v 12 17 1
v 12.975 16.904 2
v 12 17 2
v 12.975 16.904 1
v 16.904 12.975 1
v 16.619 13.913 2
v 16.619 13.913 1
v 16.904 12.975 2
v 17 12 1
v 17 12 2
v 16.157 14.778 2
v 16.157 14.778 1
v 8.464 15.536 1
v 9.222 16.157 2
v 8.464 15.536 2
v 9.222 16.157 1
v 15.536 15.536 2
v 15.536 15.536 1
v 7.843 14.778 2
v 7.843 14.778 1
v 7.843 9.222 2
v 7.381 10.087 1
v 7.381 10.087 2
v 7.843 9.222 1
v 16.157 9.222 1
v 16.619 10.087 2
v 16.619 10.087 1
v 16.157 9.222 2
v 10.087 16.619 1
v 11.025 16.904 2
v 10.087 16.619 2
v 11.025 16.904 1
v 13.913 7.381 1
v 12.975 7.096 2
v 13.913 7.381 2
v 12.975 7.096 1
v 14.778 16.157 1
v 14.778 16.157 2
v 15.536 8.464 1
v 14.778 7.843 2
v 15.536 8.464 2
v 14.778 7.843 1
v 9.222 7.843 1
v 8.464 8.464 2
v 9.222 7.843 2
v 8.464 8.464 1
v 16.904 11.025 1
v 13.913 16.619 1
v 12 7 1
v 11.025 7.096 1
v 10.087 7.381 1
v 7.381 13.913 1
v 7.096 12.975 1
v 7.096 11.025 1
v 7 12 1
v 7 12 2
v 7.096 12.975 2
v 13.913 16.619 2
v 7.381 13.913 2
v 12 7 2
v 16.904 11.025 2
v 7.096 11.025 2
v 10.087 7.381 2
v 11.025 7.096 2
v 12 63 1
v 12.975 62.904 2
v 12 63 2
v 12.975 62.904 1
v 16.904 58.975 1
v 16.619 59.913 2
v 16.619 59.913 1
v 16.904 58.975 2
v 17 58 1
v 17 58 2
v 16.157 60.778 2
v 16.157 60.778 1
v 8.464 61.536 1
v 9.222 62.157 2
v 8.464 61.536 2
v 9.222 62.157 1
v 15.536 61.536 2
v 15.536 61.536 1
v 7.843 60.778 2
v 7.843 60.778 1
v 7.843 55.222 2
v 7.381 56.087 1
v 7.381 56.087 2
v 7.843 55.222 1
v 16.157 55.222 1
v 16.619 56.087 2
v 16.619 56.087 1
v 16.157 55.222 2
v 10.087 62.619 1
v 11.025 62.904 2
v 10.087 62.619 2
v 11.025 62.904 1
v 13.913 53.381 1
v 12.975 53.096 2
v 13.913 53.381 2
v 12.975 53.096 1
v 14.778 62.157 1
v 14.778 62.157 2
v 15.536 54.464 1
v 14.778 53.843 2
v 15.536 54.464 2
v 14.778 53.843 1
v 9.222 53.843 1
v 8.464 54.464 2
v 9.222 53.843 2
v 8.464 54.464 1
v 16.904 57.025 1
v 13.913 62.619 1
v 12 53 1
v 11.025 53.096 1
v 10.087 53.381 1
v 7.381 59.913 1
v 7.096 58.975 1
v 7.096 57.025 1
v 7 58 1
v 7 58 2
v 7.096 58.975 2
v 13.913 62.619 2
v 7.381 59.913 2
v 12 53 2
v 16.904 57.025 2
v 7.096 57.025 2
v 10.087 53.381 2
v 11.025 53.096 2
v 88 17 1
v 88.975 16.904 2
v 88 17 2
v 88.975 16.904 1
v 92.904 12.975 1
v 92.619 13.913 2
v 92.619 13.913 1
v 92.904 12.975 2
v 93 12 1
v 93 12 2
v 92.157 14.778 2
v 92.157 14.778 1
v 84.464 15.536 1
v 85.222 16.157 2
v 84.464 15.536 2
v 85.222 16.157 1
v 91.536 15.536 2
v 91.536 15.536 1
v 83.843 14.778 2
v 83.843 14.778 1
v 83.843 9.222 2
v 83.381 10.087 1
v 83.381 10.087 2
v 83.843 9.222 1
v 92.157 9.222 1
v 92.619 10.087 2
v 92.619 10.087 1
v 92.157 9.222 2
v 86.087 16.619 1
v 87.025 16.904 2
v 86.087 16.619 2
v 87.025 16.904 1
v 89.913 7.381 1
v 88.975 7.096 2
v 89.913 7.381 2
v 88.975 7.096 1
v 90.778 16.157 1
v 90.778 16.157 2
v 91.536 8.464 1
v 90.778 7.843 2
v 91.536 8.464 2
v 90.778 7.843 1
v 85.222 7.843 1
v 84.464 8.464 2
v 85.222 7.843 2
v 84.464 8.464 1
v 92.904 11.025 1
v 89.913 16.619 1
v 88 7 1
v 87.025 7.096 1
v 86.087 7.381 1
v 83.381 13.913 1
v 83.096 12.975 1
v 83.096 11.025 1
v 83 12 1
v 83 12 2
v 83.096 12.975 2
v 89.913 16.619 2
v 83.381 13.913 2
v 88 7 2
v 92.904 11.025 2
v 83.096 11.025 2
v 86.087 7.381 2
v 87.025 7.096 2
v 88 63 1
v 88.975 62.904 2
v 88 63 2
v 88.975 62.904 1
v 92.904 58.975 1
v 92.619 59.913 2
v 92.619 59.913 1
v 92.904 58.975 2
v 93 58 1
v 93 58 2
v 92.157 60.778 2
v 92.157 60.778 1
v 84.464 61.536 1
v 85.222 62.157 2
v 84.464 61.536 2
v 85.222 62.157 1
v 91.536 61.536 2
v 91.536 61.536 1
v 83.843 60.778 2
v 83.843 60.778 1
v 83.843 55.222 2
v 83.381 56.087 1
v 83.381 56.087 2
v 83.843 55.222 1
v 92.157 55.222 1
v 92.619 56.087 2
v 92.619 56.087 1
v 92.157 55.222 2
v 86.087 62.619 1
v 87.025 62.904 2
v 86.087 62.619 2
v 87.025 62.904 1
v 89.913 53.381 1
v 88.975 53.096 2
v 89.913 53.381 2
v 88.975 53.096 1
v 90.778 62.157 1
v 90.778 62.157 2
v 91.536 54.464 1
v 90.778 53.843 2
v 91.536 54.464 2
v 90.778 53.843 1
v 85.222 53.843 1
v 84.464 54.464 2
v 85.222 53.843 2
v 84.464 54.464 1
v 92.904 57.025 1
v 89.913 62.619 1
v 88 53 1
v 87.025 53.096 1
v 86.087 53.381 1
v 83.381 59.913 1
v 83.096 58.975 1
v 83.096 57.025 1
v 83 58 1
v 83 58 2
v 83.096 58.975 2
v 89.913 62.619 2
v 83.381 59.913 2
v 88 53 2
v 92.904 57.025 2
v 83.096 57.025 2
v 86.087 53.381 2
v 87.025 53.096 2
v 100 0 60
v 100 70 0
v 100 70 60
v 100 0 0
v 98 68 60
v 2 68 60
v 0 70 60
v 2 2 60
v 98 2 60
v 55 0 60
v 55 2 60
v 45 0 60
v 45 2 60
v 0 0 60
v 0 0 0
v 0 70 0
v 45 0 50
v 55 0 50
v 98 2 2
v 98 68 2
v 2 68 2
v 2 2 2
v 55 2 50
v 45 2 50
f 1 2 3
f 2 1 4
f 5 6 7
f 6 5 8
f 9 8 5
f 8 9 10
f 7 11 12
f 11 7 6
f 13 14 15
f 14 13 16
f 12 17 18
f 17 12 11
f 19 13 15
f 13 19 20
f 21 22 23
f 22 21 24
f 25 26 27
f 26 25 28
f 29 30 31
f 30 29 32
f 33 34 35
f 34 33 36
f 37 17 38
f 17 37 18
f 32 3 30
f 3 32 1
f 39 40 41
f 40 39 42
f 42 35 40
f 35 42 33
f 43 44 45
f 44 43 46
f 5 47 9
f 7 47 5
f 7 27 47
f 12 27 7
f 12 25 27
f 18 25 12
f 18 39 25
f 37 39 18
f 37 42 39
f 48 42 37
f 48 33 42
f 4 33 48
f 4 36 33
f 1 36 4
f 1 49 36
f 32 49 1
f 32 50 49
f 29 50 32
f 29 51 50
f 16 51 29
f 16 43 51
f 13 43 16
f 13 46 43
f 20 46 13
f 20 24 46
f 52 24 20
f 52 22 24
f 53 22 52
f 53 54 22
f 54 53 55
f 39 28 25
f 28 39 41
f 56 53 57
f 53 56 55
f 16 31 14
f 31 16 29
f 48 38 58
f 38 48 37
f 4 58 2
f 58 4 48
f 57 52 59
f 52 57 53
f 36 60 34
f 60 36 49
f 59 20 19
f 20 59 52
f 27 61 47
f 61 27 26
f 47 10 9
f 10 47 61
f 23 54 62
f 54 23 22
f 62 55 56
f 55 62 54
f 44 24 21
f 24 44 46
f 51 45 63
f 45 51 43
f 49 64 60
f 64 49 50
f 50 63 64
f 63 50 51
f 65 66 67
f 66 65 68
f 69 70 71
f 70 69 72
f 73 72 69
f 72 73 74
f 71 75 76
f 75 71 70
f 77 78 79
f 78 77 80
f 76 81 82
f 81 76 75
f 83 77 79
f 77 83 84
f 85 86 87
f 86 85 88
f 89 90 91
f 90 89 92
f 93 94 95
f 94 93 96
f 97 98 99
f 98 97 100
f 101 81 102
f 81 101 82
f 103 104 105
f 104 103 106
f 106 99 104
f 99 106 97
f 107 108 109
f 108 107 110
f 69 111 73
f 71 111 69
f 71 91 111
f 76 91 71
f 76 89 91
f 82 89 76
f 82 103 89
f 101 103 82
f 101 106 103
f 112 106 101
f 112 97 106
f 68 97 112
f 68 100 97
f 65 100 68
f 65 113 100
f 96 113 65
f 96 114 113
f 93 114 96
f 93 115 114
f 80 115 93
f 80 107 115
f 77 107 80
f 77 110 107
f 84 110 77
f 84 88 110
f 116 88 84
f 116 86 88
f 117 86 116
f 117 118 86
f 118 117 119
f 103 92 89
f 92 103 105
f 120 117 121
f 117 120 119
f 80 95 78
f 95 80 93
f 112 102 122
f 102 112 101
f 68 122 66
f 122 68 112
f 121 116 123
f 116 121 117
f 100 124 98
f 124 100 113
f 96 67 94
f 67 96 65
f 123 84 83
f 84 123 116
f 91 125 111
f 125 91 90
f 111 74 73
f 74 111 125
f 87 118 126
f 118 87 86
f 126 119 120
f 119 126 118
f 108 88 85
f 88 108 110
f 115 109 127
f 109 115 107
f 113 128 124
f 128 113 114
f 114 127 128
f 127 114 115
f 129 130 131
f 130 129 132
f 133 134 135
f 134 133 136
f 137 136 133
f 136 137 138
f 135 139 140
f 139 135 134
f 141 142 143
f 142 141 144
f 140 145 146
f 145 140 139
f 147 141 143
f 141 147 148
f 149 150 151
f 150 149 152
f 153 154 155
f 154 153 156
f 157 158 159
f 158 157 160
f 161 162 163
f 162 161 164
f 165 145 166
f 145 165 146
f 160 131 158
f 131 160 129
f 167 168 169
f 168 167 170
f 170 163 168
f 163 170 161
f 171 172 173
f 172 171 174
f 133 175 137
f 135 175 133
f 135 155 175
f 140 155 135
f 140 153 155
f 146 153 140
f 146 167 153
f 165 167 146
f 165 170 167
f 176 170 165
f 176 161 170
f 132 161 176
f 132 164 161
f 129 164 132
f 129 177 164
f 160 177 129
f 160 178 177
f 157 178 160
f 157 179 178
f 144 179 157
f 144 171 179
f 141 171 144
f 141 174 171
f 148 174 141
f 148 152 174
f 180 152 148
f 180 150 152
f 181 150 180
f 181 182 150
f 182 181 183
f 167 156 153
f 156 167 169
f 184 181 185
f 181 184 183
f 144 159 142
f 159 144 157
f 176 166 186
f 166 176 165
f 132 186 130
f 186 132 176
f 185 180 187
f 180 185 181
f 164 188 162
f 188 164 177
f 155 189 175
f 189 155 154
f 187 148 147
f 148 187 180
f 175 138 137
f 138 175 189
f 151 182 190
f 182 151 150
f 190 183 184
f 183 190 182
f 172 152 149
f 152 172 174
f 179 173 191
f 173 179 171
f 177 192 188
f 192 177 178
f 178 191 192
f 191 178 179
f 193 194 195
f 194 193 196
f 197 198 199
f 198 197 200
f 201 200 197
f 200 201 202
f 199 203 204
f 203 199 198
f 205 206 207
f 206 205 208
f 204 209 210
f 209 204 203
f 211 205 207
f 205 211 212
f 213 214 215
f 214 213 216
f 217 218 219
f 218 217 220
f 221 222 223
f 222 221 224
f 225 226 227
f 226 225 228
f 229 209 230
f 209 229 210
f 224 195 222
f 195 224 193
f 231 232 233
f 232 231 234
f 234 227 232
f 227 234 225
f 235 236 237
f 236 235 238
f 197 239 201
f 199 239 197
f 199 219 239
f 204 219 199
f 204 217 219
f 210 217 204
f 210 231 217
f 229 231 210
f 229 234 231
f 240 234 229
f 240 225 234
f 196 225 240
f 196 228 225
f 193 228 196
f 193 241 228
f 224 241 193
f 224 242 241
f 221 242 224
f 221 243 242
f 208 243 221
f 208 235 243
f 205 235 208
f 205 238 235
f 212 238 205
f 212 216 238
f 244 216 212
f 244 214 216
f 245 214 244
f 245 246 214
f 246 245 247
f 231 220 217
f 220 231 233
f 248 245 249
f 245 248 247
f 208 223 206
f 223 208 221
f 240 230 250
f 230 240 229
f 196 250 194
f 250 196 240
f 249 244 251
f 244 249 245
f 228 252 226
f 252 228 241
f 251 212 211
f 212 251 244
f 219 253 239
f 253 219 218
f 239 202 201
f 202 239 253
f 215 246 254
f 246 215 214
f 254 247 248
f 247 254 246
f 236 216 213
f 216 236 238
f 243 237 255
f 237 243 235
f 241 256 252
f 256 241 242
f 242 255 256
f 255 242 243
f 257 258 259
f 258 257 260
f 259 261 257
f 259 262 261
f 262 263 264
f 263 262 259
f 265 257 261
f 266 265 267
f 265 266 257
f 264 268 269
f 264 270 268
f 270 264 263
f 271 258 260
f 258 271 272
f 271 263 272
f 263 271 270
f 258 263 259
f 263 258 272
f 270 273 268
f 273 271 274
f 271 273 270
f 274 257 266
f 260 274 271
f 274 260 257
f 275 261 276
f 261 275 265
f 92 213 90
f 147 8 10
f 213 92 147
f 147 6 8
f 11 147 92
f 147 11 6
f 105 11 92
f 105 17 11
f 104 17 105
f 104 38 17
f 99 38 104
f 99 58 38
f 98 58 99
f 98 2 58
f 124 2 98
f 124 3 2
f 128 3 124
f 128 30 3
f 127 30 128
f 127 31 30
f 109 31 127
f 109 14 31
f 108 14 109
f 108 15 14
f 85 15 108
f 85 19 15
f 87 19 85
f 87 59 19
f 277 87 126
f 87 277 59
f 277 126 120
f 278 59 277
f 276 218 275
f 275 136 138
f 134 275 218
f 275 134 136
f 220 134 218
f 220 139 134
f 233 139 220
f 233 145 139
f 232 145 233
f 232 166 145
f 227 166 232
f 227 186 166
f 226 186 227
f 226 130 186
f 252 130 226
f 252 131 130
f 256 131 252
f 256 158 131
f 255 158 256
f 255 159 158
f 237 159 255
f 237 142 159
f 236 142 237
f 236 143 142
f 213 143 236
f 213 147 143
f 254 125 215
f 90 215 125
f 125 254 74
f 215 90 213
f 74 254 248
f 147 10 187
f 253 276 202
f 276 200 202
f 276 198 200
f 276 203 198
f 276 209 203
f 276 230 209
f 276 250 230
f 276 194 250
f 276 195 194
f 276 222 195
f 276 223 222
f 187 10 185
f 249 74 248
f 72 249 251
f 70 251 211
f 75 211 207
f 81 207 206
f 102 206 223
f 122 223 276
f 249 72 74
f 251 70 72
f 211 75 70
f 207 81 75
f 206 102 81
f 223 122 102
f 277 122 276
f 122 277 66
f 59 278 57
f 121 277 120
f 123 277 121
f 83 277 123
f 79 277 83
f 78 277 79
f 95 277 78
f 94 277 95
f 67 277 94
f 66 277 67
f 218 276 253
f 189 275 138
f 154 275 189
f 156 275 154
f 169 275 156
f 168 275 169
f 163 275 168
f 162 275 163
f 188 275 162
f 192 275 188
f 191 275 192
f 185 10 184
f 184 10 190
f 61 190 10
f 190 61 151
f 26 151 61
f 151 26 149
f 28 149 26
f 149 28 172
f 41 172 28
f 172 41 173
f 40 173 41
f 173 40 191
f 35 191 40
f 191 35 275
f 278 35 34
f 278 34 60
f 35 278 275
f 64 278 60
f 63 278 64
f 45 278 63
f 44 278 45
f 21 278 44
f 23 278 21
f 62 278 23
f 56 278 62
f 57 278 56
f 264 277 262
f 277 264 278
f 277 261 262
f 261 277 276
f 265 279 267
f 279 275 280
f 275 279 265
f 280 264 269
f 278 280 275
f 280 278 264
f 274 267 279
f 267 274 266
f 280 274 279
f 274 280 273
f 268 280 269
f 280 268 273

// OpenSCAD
$fn = 32;

// ----------------------------------------------------------------------
// Enclosure box: both enclosure
// ----------------------------------------------------------------------

// --- parameters (mm) ---
box_l = 100;              // outer length, X
box_w = 70;               // outer width, Y
box_h = 60;               // outer height
wall_t = 2;               // wall thickness
boss_r = 5;               // corner boss radius
hole_r = 2;               // boss screw hole radius
boss_in = 12;             // boss inset from the corners
notch_w = 10;             // cable notch width
notch_h = 10;             // cable notch height

inner_h = box_h - wall_t;  // cavity depth
boss_h = inner_h - 2;  // corner boss height

difference() {
  cube([box_l, box_w, box_h]);
  translate([wall_t, wall_t, wall_t])
    cube([box_l - 2 * wall_t, box_w - 2 * wall_t, box_h]);
  for (sx = [0, 1], sy = [0, 1])
    translate([sx ? box_l - boss_in : boss_in,
               sy ? box_w - boss_in : boss_in, wall_t - 1]) {
      cylinder(r = boss_r, h = boss_h);
      translate([0, 0, boss_h - 4])
        cylinder(r = hole_r, h = 5);
    }
  translate([box_l / 2 - notch_w / 2, -1, box_h - notch_h])
    cube([notch_w, wall_t + 2, notch_h + 1]);
}
